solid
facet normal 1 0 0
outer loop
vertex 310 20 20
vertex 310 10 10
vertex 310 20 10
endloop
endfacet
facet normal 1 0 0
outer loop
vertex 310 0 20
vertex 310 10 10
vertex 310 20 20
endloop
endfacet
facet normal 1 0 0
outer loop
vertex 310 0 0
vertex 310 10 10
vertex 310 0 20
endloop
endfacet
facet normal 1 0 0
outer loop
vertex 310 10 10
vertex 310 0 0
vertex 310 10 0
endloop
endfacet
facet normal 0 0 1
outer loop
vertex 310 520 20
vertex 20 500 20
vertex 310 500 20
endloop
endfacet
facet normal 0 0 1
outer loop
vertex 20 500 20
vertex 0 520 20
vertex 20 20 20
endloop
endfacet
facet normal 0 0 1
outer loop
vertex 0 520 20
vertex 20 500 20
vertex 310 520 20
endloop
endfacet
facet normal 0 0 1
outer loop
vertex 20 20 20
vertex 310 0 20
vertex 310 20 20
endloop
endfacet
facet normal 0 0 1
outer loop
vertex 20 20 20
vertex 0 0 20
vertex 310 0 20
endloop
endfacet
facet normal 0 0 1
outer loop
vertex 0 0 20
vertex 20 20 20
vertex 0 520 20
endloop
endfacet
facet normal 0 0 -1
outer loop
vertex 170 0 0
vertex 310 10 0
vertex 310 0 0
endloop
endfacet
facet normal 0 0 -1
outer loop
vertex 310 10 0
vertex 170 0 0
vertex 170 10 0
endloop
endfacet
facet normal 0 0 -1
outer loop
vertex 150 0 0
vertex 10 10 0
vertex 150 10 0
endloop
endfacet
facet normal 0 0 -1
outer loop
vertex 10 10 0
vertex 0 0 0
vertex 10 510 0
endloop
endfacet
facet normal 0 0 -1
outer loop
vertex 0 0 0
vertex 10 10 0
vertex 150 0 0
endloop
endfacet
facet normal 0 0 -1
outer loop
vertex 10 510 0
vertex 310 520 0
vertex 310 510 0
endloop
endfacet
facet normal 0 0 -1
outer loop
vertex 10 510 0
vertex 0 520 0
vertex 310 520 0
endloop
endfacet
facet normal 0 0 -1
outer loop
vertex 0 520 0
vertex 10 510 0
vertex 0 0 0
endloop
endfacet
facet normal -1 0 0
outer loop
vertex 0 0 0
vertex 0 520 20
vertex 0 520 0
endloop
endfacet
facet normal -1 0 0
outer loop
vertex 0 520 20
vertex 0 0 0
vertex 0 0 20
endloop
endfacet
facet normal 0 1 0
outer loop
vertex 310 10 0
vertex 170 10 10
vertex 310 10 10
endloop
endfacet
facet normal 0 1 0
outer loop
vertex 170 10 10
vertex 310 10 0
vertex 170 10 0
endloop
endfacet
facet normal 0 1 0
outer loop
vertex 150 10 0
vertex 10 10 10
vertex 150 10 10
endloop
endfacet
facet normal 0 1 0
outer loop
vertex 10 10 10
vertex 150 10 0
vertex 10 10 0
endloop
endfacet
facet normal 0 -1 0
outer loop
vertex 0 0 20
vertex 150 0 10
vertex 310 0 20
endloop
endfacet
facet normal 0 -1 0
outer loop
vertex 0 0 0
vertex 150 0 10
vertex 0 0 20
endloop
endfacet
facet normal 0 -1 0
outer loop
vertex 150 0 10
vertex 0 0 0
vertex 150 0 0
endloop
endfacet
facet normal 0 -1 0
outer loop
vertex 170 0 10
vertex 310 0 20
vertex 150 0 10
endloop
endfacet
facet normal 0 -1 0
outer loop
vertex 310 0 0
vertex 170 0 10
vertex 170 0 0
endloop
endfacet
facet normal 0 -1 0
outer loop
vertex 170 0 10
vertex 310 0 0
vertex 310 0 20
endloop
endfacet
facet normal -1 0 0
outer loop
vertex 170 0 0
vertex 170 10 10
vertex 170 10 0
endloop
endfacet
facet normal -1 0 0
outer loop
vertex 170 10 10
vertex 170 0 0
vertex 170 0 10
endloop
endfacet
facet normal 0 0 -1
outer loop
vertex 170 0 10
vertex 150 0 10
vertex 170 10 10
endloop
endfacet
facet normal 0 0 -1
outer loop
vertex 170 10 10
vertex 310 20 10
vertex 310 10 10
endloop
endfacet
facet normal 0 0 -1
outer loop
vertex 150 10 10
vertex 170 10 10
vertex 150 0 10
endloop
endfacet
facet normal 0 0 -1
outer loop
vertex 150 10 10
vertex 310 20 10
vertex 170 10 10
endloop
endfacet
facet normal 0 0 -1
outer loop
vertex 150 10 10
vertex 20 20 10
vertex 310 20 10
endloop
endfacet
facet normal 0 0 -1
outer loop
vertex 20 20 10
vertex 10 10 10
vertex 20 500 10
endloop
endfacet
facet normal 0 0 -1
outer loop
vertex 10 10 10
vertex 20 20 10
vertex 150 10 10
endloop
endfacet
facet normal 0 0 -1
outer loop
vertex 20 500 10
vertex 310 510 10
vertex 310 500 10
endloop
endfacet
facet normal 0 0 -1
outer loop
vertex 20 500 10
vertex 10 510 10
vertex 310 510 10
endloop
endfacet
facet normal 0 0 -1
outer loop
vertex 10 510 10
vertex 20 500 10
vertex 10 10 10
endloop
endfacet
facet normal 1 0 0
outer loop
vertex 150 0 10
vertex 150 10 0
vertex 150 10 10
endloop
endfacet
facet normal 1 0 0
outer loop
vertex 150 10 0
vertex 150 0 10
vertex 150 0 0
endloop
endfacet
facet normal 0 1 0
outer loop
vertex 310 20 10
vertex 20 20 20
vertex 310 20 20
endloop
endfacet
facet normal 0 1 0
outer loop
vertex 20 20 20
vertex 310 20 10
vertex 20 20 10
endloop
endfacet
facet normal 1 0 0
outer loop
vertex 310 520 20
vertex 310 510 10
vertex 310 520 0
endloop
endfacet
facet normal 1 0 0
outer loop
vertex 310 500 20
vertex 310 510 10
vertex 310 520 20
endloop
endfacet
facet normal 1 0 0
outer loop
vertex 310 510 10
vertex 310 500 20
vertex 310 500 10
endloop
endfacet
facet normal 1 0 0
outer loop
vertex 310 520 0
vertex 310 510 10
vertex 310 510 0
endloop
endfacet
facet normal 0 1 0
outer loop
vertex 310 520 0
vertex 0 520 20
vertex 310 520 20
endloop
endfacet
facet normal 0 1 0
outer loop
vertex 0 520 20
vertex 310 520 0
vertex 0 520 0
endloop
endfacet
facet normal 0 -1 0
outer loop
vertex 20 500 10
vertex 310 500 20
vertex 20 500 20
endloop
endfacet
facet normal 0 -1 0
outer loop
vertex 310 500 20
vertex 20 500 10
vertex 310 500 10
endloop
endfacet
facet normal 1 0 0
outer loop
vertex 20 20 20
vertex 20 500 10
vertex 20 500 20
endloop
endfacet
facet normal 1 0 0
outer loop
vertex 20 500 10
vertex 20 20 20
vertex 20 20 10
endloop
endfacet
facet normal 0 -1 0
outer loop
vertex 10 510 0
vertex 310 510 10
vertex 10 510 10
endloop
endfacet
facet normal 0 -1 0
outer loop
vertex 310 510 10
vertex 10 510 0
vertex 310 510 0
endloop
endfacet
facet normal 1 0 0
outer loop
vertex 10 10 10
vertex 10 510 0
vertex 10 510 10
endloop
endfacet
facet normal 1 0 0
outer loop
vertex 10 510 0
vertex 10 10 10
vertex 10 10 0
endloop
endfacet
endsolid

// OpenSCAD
ipad_width = 300;
ipad_height = 500;

border_size = 10;

cord_size = 20;


// edges
///////////////////////////////////////////////////////////////////////////////

// bottom edge, with cord cut-out
difference() {
	cube([ipad_width + border_size, border_size, border_size * 2]);

	translate([(ipad_width - cord_size) / 2 + border_size, border_size * -1, border_size * -1]) {
		cube([cord_size, border_size * 3, border_size * 2]);
	}
}

// top edge
translate([0, ipad_height + border_size, 0]) {
	cube([ipad_width + border_size, border_size, border_size * 2]);
}

// side
cube([border_size, ipad_height + border_size * 2, border_size * 2]);


// ridges
///////////////////////////////////////////////////////////////////////////////

translate([0, 0, border_size]) {
	// top
	cube([ipad_width + border_size, border_size * 2, border_size]);

	// bottom
	translate([0, ipad_height, 0]) {
		cube([ipad_width + border_size, border_size * 2, border_size]);
	}

	// side
	cube([border_size * 2, ipad_height + border_size * 2, border_size]);
}
